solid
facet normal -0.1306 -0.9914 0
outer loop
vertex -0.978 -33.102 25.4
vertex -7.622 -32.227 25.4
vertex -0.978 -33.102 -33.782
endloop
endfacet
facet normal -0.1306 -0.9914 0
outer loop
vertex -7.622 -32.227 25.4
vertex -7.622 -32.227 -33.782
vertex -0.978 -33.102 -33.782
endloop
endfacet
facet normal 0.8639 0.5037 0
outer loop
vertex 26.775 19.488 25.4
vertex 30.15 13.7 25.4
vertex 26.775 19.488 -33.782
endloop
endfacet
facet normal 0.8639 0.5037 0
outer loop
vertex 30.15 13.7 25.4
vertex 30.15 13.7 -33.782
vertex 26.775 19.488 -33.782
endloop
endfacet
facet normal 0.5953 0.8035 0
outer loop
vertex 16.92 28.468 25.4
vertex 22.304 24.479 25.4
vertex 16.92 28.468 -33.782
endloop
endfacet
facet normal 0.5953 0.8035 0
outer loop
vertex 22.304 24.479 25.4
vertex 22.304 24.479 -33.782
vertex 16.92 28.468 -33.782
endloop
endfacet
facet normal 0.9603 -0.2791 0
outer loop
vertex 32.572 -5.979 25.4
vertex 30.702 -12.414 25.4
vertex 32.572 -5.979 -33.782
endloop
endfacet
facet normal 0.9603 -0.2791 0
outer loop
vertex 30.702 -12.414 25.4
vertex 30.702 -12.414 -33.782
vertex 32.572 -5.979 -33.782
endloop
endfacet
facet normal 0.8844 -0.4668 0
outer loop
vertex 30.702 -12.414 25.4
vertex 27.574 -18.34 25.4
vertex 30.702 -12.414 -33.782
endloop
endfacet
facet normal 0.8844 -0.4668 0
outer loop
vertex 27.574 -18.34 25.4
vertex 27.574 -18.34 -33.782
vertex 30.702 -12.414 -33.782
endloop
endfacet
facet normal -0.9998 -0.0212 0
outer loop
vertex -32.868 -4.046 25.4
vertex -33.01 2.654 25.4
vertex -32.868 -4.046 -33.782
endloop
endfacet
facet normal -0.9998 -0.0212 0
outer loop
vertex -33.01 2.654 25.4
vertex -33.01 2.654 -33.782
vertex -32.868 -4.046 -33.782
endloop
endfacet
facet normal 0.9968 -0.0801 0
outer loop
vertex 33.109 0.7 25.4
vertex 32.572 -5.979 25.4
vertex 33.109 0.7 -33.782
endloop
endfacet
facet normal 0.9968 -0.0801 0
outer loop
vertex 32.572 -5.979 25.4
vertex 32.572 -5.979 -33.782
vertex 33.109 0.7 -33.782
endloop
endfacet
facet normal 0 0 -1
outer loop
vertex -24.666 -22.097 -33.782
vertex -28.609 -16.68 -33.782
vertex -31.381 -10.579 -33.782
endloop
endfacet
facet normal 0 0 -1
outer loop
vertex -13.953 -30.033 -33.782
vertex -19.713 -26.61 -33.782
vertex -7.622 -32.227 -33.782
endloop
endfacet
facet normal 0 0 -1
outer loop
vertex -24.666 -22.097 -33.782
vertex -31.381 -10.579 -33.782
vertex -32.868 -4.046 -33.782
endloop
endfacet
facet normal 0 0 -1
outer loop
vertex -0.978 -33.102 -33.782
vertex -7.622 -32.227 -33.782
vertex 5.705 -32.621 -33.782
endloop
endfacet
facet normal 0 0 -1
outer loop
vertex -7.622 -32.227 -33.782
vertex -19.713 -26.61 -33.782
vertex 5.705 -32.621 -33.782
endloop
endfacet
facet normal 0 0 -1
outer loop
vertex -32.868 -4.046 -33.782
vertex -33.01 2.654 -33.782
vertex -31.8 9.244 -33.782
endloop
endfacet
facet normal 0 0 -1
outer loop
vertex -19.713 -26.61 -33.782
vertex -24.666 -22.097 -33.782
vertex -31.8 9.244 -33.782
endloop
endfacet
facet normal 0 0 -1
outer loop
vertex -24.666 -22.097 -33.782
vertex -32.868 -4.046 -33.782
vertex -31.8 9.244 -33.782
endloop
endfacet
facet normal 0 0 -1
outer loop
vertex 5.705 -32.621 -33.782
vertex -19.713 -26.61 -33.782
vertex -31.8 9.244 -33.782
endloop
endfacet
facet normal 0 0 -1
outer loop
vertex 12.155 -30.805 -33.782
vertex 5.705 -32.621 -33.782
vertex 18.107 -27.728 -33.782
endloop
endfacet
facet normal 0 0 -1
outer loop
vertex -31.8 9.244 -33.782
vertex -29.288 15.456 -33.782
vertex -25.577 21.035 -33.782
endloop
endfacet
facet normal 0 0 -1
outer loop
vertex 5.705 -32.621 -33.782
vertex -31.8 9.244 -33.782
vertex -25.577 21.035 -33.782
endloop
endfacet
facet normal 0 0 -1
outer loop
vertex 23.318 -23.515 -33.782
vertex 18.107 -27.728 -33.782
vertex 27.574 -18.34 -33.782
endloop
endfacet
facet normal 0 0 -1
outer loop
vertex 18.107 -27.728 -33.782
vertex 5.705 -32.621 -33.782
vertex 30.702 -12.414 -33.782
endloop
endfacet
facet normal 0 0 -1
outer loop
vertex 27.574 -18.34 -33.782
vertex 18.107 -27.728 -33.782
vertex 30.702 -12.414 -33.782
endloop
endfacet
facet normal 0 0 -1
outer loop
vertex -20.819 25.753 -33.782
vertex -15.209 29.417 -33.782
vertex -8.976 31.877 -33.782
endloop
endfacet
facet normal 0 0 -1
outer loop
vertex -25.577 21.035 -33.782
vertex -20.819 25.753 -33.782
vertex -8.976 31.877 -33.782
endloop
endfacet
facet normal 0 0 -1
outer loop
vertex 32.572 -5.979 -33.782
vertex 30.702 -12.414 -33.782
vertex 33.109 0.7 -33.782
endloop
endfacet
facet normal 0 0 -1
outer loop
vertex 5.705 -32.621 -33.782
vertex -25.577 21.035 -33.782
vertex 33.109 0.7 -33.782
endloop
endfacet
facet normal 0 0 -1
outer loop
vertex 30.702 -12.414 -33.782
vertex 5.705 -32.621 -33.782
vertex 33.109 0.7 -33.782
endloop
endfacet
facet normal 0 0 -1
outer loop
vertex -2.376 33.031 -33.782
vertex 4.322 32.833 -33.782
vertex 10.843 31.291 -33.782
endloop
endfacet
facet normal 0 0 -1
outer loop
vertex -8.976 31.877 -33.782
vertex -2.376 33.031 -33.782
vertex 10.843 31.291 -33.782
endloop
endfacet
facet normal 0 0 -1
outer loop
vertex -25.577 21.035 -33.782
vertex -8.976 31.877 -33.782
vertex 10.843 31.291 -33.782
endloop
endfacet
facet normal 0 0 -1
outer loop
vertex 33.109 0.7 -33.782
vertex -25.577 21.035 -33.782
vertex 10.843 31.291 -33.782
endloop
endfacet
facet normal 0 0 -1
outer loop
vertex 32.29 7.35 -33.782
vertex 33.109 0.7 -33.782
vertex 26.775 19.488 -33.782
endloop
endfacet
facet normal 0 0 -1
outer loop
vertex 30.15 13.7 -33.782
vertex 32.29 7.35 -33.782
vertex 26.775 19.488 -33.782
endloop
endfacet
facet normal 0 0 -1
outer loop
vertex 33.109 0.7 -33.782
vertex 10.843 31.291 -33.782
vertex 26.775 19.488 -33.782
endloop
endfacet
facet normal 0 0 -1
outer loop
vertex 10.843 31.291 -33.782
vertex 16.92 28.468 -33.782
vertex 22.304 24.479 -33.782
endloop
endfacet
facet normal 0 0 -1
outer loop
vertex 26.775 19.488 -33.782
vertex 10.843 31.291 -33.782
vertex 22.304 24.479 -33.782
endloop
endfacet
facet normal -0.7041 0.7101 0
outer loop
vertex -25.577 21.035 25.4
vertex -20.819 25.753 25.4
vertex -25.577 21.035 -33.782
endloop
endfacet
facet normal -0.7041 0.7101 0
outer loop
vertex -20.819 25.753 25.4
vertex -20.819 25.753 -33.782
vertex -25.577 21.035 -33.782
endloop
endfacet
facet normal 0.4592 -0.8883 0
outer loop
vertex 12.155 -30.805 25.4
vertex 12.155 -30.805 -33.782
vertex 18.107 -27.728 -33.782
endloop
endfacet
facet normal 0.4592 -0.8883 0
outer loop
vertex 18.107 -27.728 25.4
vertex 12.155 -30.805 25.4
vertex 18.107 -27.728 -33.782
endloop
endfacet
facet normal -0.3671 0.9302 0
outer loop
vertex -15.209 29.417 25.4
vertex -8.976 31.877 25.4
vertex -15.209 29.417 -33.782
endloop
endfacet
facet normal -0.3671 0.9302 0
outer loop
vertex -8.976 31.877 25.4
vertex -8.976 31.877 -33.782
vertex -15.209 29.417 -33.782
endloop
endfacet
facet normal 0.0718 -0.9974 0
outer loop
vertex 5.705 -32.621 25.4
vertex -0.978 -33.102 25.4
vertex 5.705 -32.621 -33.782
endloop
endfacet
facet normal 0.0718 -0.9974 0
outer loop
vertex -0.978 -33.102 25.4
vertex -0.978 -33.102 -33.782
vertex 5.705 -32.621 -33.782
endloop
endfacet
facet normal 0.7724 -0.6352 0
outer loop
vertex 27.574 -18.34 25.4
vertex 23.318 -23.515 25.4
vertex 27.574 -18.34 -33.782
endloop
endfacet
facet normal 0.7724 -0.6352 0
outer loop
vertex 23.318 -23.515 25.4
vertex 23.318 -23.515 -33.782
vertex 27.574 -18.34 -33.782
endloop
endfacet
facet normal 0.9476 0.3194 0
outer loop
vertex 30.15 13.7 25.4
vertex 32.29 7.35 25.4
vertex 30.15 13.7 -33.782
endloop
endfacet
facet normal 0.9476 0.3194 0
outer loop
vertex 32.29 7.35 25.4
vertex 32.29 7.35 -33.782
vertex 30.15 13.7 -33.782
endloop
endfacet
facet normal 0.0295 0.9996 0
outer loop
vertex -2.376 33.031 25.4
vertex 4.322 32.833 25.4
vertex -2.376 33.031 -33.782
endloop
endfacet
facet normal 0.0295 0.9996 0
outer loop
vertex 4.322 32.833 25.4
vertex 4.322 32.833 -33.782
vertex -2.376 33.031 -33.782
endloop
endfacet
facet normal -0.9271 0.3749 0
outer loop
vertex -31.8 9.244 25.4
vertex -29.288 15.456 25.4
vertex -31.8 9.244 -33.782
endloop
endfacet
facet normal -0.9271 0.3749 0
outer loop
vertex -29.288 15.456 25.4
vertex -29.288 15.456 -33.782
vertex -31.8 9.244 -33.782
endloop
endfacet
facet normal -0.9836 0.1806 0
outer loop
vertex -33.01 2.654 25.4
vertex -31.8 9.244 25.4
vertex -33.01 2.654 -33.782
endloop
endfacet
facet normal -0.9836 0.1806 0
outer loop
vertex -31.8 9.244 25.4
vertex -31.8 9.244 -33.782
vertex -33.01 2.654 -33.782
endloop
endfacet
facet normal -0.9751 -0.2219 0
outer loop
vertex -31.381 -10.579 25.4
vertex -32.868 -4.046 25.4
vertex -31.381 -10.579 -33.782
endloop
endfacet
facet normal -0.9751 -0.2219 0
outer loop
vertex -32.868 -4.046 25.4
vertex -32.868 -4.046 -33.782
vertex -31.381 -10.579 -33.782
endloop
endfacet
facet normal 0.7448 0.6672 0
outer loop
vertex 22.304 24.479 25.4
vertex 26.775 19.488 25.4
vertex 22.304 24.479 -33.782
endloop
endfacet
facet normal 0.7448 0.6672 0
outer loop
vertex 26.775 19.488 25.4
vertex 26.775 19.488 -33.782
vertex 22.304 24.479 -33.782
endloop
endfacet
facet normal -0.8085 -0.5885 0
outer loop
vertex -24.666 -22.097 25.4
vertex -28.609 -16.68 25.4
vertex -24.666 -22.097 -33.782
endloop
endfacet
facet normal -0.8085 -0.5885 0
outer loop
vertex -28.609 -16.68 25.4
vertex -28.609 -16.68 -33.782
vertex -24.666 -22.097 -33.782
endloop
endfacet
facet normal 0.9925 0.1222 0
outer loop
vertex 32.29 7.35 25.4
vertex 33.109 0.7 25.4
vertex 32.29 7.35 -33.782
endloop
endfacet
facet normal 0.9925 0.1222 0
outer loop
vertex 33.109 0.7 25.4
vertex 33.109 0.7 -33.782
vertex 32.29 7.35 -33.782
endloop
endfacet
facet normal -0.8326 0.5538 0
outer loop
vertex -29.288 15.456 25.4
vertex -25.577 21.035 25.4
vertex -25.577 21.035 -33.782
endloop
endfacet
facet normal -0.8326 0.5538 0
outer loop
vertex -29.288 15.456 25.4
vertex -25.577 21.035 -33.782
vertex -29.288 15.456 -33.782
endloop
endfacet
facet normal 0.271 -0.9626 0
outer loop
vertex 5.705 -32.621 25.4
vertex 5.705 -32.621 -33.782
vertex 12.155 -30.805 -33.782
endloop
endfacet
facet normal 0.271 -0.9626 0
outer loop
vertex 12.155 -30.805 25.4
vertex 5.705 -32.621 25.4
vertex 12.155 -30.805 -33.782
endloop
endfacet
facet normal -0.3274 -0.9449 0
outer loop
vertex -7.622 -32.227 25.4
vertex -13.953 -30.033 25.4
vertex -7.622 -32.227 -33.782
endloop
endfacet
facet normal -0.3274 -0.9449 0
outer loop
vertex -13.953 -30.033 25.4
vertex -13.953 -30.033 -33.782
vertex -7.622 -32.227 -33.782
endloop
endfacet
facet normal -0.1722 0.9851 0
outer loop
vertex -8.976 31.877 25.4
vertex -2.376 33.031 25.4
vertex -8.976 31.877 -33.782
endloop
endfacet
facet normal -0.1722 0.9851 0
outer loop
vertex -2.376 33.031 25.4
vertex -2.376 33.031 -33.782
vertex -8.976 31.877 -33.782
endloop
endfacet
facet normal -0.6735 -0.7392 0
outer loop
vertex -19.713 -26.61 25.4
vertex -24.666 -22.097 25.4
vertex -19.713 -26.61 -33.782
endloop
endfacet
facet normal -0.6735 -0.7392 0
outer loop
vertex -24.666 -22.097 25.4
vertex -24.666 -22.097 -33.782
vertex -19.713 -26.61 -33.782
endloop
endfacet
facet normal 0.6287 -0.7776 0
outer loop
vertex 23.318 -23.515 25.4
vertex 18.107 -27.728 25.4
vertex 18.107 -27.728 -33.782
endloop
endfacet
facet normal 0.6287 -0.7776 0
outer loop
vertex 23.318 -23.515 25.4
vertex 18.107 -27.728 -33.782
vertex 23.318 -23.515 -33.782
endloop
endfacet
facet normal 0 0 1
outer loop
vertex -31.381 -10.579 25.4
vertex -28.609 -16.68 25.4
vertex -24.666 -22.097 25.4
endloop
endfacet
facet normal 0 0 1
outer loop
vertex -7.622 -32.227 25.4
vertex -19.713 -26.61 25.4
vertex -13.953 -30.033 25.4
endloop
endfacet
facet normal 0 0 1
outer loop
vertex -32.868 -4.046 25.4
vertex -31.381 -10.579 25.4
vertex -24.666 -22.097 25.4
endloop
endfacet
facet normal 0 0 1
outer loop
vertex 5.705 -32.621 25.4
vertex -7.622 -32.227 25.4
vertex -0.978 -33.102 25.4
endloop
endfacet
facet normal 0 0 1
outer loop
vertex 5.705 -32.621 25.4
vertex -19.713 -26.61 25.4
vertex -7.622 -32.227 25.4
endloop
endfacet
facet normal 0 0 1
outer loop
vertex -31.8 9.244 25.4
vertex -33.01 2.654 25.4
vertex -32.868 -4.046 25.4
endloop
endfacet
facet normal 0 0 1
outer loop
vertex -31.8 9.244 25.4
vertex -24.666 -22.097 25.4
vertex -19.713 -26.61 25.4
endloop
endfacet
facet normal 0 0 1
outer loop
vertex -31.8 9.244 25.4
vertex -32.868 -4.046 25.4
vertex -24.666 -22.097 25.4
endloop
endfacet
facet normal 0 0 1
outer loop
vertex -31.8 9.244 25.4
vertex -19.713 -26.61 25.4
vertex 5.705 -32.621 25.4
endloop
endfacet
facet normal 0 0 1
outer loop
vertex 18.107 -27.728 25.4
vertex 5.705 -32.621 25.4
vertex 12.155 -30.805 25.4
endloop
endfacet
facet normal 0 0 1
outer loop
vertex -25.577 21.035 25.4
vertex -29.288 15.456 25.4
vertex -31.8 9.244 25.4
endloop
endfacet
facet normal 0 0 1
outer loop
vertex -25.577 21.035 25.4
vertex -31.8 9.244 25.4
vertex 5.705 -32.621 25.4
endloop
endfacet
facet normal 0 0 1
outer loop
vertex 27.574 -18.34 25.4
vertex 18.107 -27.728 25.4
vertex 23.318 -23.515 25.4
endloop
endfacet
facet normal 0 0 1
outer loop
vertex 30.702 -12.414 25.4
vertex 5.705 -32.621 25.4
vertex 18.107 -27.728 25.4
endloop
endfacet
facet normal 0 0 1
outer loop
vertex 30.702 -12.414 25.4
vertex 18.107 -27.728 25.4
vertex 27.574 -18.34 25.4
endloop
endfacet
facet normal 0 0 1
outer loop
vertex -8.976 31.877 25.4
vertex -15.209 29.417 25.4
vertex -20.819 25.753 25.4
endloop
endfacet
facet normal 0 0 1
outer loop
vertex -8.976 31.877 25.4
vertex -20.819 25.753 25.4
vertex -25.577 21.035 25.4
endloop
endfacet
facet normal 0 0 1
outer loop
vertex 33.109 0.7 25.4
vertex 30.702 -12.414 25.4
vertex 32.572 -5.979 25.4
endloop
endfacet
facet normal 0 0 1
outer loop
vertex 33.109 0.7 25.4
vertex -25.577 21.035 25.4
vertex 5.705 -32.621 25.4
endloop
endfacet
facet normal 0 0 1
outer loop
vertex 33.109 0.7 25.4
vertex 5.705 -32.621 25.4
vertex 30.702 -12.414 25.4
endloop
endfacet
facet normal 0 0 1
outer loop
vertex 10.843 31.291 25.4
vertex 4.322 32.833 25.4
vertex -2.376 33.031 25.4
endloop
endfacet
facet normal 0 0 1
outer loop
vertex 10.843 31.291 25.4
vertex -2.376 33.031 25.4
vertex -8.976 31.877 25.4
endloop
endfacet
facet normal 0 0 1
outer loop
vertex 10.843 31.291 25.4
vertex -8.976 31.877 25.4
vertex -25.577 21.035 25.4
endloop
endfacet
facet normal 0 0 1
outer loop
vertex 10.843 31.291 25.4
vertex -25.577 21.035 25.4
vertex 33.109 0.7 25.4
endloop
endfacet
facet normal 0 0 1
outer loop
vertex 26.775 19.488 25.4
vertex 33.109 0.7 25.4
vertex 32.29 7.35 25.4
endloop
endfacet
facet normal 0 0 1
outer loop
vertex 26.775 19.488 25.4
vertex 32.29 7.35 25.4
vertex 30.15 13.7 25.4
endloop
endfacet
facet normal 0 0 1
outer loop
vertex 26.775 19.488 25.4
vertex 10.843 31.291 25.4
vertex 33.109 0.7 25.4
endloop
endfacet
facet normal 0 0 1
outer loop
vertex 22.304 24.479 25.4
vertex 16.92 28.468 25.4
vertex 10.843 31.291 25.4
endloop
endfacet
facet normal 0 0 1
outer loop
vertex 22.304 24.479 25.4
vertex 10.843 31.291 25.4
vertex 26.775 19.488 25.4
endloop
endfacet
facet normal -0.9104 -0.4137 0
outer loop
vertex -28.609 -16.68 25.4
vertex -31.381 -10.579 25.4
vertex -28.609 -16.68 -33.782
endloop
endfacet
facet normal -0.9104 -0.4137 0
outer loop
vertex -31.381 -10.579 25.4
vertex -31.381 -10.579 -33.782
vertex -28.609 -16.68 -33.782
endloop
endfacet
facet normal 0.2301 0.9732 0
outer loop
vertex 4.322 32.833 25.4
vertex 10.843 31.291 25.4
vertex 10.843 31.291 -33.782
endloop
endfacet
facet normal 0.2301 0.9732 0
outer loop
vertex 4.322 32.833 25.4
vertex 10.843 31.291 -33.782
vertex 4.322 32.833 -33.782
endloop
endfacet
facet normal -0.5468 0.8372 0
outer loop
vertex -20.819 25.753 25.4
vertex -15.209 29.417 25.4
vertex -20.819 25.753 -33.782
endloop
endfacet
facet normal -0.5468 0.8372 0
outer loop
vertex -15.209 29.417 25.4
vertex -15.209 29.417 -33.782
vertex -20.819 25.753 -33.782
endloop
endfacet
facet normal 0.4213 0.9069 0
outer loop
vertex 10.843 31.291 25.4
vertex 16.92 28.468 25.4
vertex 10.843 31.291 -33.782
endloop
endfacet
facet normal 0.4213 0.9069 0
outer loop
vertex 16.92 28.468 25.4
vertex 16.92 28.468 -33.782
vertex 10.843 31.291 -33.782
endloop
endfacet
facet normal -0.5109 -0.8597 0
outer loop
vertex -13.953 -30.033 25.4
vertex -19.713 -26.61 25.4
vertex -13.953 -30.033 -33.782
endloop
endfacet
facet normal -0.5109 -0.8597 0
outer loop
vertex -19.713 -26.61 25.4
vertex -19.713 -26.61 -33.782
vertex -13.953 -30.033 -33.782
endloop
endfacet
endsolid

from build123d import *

# Parameters (mm, degrees)
F1_DEPTH      = 33.782
F1_DEPTH_BACK = 25.4


with BuildPart() as f1:
    # F0 (on Top) → F1 (new body, two sides)
    with BuildSketch(Plane.XY) as f1_sk:
        Polygon((18.1071458891, -27.7275939392), (23.3180151746, -23.5150667919), (27.5742421791, -18.3398300471), (30.7015764689, -12.4137585054), (32.5719846108, -5.979466232), (33.1088918757, 0.6996260916), (32.2903172171, 7.3500756408), (30.1497731777, 13.6996122296), (26.7748938819, 19.4882850841), (22.3038472847, 24.4791052575), (16.9196785591, 28.4677479855), (10.8428162052, 31.2909177661), (4.322047682, 32.8330336969), (-2.3756659812, 33.0309613704), (-8.9761196, 31.8765976044), (-15.2090898277, 29.4172021872), (-20.8193981308, 25.753463056), (-25.5773578283, 21.0353741214), (-29.2881774911, 15.4560944988), (-31.7999357262, 9.2440405513), (-33.0098008564, 2.6535344976), (-32.868240861, -4.0456075703), (-31.3810512229, -10.5791219889), (-28.6091176606, -16.6795259103), (-24.6659234598, -22.0970680811), (-19.7129034545, -26.6099536884), (-13.9528348656, -30.0334246652), (-7.6215355779, -32.2273237074), (-0.9782097282, -33.1018323305), (5.7051641428, -32.6211480486), (12.1549679234, -30.8049501329), align=None)
    extrude(amount=-F1_DEPTH)
    extrude(f1_sk.sketch, amount=F1_DEPTH_BACK)


solid = f1.part
